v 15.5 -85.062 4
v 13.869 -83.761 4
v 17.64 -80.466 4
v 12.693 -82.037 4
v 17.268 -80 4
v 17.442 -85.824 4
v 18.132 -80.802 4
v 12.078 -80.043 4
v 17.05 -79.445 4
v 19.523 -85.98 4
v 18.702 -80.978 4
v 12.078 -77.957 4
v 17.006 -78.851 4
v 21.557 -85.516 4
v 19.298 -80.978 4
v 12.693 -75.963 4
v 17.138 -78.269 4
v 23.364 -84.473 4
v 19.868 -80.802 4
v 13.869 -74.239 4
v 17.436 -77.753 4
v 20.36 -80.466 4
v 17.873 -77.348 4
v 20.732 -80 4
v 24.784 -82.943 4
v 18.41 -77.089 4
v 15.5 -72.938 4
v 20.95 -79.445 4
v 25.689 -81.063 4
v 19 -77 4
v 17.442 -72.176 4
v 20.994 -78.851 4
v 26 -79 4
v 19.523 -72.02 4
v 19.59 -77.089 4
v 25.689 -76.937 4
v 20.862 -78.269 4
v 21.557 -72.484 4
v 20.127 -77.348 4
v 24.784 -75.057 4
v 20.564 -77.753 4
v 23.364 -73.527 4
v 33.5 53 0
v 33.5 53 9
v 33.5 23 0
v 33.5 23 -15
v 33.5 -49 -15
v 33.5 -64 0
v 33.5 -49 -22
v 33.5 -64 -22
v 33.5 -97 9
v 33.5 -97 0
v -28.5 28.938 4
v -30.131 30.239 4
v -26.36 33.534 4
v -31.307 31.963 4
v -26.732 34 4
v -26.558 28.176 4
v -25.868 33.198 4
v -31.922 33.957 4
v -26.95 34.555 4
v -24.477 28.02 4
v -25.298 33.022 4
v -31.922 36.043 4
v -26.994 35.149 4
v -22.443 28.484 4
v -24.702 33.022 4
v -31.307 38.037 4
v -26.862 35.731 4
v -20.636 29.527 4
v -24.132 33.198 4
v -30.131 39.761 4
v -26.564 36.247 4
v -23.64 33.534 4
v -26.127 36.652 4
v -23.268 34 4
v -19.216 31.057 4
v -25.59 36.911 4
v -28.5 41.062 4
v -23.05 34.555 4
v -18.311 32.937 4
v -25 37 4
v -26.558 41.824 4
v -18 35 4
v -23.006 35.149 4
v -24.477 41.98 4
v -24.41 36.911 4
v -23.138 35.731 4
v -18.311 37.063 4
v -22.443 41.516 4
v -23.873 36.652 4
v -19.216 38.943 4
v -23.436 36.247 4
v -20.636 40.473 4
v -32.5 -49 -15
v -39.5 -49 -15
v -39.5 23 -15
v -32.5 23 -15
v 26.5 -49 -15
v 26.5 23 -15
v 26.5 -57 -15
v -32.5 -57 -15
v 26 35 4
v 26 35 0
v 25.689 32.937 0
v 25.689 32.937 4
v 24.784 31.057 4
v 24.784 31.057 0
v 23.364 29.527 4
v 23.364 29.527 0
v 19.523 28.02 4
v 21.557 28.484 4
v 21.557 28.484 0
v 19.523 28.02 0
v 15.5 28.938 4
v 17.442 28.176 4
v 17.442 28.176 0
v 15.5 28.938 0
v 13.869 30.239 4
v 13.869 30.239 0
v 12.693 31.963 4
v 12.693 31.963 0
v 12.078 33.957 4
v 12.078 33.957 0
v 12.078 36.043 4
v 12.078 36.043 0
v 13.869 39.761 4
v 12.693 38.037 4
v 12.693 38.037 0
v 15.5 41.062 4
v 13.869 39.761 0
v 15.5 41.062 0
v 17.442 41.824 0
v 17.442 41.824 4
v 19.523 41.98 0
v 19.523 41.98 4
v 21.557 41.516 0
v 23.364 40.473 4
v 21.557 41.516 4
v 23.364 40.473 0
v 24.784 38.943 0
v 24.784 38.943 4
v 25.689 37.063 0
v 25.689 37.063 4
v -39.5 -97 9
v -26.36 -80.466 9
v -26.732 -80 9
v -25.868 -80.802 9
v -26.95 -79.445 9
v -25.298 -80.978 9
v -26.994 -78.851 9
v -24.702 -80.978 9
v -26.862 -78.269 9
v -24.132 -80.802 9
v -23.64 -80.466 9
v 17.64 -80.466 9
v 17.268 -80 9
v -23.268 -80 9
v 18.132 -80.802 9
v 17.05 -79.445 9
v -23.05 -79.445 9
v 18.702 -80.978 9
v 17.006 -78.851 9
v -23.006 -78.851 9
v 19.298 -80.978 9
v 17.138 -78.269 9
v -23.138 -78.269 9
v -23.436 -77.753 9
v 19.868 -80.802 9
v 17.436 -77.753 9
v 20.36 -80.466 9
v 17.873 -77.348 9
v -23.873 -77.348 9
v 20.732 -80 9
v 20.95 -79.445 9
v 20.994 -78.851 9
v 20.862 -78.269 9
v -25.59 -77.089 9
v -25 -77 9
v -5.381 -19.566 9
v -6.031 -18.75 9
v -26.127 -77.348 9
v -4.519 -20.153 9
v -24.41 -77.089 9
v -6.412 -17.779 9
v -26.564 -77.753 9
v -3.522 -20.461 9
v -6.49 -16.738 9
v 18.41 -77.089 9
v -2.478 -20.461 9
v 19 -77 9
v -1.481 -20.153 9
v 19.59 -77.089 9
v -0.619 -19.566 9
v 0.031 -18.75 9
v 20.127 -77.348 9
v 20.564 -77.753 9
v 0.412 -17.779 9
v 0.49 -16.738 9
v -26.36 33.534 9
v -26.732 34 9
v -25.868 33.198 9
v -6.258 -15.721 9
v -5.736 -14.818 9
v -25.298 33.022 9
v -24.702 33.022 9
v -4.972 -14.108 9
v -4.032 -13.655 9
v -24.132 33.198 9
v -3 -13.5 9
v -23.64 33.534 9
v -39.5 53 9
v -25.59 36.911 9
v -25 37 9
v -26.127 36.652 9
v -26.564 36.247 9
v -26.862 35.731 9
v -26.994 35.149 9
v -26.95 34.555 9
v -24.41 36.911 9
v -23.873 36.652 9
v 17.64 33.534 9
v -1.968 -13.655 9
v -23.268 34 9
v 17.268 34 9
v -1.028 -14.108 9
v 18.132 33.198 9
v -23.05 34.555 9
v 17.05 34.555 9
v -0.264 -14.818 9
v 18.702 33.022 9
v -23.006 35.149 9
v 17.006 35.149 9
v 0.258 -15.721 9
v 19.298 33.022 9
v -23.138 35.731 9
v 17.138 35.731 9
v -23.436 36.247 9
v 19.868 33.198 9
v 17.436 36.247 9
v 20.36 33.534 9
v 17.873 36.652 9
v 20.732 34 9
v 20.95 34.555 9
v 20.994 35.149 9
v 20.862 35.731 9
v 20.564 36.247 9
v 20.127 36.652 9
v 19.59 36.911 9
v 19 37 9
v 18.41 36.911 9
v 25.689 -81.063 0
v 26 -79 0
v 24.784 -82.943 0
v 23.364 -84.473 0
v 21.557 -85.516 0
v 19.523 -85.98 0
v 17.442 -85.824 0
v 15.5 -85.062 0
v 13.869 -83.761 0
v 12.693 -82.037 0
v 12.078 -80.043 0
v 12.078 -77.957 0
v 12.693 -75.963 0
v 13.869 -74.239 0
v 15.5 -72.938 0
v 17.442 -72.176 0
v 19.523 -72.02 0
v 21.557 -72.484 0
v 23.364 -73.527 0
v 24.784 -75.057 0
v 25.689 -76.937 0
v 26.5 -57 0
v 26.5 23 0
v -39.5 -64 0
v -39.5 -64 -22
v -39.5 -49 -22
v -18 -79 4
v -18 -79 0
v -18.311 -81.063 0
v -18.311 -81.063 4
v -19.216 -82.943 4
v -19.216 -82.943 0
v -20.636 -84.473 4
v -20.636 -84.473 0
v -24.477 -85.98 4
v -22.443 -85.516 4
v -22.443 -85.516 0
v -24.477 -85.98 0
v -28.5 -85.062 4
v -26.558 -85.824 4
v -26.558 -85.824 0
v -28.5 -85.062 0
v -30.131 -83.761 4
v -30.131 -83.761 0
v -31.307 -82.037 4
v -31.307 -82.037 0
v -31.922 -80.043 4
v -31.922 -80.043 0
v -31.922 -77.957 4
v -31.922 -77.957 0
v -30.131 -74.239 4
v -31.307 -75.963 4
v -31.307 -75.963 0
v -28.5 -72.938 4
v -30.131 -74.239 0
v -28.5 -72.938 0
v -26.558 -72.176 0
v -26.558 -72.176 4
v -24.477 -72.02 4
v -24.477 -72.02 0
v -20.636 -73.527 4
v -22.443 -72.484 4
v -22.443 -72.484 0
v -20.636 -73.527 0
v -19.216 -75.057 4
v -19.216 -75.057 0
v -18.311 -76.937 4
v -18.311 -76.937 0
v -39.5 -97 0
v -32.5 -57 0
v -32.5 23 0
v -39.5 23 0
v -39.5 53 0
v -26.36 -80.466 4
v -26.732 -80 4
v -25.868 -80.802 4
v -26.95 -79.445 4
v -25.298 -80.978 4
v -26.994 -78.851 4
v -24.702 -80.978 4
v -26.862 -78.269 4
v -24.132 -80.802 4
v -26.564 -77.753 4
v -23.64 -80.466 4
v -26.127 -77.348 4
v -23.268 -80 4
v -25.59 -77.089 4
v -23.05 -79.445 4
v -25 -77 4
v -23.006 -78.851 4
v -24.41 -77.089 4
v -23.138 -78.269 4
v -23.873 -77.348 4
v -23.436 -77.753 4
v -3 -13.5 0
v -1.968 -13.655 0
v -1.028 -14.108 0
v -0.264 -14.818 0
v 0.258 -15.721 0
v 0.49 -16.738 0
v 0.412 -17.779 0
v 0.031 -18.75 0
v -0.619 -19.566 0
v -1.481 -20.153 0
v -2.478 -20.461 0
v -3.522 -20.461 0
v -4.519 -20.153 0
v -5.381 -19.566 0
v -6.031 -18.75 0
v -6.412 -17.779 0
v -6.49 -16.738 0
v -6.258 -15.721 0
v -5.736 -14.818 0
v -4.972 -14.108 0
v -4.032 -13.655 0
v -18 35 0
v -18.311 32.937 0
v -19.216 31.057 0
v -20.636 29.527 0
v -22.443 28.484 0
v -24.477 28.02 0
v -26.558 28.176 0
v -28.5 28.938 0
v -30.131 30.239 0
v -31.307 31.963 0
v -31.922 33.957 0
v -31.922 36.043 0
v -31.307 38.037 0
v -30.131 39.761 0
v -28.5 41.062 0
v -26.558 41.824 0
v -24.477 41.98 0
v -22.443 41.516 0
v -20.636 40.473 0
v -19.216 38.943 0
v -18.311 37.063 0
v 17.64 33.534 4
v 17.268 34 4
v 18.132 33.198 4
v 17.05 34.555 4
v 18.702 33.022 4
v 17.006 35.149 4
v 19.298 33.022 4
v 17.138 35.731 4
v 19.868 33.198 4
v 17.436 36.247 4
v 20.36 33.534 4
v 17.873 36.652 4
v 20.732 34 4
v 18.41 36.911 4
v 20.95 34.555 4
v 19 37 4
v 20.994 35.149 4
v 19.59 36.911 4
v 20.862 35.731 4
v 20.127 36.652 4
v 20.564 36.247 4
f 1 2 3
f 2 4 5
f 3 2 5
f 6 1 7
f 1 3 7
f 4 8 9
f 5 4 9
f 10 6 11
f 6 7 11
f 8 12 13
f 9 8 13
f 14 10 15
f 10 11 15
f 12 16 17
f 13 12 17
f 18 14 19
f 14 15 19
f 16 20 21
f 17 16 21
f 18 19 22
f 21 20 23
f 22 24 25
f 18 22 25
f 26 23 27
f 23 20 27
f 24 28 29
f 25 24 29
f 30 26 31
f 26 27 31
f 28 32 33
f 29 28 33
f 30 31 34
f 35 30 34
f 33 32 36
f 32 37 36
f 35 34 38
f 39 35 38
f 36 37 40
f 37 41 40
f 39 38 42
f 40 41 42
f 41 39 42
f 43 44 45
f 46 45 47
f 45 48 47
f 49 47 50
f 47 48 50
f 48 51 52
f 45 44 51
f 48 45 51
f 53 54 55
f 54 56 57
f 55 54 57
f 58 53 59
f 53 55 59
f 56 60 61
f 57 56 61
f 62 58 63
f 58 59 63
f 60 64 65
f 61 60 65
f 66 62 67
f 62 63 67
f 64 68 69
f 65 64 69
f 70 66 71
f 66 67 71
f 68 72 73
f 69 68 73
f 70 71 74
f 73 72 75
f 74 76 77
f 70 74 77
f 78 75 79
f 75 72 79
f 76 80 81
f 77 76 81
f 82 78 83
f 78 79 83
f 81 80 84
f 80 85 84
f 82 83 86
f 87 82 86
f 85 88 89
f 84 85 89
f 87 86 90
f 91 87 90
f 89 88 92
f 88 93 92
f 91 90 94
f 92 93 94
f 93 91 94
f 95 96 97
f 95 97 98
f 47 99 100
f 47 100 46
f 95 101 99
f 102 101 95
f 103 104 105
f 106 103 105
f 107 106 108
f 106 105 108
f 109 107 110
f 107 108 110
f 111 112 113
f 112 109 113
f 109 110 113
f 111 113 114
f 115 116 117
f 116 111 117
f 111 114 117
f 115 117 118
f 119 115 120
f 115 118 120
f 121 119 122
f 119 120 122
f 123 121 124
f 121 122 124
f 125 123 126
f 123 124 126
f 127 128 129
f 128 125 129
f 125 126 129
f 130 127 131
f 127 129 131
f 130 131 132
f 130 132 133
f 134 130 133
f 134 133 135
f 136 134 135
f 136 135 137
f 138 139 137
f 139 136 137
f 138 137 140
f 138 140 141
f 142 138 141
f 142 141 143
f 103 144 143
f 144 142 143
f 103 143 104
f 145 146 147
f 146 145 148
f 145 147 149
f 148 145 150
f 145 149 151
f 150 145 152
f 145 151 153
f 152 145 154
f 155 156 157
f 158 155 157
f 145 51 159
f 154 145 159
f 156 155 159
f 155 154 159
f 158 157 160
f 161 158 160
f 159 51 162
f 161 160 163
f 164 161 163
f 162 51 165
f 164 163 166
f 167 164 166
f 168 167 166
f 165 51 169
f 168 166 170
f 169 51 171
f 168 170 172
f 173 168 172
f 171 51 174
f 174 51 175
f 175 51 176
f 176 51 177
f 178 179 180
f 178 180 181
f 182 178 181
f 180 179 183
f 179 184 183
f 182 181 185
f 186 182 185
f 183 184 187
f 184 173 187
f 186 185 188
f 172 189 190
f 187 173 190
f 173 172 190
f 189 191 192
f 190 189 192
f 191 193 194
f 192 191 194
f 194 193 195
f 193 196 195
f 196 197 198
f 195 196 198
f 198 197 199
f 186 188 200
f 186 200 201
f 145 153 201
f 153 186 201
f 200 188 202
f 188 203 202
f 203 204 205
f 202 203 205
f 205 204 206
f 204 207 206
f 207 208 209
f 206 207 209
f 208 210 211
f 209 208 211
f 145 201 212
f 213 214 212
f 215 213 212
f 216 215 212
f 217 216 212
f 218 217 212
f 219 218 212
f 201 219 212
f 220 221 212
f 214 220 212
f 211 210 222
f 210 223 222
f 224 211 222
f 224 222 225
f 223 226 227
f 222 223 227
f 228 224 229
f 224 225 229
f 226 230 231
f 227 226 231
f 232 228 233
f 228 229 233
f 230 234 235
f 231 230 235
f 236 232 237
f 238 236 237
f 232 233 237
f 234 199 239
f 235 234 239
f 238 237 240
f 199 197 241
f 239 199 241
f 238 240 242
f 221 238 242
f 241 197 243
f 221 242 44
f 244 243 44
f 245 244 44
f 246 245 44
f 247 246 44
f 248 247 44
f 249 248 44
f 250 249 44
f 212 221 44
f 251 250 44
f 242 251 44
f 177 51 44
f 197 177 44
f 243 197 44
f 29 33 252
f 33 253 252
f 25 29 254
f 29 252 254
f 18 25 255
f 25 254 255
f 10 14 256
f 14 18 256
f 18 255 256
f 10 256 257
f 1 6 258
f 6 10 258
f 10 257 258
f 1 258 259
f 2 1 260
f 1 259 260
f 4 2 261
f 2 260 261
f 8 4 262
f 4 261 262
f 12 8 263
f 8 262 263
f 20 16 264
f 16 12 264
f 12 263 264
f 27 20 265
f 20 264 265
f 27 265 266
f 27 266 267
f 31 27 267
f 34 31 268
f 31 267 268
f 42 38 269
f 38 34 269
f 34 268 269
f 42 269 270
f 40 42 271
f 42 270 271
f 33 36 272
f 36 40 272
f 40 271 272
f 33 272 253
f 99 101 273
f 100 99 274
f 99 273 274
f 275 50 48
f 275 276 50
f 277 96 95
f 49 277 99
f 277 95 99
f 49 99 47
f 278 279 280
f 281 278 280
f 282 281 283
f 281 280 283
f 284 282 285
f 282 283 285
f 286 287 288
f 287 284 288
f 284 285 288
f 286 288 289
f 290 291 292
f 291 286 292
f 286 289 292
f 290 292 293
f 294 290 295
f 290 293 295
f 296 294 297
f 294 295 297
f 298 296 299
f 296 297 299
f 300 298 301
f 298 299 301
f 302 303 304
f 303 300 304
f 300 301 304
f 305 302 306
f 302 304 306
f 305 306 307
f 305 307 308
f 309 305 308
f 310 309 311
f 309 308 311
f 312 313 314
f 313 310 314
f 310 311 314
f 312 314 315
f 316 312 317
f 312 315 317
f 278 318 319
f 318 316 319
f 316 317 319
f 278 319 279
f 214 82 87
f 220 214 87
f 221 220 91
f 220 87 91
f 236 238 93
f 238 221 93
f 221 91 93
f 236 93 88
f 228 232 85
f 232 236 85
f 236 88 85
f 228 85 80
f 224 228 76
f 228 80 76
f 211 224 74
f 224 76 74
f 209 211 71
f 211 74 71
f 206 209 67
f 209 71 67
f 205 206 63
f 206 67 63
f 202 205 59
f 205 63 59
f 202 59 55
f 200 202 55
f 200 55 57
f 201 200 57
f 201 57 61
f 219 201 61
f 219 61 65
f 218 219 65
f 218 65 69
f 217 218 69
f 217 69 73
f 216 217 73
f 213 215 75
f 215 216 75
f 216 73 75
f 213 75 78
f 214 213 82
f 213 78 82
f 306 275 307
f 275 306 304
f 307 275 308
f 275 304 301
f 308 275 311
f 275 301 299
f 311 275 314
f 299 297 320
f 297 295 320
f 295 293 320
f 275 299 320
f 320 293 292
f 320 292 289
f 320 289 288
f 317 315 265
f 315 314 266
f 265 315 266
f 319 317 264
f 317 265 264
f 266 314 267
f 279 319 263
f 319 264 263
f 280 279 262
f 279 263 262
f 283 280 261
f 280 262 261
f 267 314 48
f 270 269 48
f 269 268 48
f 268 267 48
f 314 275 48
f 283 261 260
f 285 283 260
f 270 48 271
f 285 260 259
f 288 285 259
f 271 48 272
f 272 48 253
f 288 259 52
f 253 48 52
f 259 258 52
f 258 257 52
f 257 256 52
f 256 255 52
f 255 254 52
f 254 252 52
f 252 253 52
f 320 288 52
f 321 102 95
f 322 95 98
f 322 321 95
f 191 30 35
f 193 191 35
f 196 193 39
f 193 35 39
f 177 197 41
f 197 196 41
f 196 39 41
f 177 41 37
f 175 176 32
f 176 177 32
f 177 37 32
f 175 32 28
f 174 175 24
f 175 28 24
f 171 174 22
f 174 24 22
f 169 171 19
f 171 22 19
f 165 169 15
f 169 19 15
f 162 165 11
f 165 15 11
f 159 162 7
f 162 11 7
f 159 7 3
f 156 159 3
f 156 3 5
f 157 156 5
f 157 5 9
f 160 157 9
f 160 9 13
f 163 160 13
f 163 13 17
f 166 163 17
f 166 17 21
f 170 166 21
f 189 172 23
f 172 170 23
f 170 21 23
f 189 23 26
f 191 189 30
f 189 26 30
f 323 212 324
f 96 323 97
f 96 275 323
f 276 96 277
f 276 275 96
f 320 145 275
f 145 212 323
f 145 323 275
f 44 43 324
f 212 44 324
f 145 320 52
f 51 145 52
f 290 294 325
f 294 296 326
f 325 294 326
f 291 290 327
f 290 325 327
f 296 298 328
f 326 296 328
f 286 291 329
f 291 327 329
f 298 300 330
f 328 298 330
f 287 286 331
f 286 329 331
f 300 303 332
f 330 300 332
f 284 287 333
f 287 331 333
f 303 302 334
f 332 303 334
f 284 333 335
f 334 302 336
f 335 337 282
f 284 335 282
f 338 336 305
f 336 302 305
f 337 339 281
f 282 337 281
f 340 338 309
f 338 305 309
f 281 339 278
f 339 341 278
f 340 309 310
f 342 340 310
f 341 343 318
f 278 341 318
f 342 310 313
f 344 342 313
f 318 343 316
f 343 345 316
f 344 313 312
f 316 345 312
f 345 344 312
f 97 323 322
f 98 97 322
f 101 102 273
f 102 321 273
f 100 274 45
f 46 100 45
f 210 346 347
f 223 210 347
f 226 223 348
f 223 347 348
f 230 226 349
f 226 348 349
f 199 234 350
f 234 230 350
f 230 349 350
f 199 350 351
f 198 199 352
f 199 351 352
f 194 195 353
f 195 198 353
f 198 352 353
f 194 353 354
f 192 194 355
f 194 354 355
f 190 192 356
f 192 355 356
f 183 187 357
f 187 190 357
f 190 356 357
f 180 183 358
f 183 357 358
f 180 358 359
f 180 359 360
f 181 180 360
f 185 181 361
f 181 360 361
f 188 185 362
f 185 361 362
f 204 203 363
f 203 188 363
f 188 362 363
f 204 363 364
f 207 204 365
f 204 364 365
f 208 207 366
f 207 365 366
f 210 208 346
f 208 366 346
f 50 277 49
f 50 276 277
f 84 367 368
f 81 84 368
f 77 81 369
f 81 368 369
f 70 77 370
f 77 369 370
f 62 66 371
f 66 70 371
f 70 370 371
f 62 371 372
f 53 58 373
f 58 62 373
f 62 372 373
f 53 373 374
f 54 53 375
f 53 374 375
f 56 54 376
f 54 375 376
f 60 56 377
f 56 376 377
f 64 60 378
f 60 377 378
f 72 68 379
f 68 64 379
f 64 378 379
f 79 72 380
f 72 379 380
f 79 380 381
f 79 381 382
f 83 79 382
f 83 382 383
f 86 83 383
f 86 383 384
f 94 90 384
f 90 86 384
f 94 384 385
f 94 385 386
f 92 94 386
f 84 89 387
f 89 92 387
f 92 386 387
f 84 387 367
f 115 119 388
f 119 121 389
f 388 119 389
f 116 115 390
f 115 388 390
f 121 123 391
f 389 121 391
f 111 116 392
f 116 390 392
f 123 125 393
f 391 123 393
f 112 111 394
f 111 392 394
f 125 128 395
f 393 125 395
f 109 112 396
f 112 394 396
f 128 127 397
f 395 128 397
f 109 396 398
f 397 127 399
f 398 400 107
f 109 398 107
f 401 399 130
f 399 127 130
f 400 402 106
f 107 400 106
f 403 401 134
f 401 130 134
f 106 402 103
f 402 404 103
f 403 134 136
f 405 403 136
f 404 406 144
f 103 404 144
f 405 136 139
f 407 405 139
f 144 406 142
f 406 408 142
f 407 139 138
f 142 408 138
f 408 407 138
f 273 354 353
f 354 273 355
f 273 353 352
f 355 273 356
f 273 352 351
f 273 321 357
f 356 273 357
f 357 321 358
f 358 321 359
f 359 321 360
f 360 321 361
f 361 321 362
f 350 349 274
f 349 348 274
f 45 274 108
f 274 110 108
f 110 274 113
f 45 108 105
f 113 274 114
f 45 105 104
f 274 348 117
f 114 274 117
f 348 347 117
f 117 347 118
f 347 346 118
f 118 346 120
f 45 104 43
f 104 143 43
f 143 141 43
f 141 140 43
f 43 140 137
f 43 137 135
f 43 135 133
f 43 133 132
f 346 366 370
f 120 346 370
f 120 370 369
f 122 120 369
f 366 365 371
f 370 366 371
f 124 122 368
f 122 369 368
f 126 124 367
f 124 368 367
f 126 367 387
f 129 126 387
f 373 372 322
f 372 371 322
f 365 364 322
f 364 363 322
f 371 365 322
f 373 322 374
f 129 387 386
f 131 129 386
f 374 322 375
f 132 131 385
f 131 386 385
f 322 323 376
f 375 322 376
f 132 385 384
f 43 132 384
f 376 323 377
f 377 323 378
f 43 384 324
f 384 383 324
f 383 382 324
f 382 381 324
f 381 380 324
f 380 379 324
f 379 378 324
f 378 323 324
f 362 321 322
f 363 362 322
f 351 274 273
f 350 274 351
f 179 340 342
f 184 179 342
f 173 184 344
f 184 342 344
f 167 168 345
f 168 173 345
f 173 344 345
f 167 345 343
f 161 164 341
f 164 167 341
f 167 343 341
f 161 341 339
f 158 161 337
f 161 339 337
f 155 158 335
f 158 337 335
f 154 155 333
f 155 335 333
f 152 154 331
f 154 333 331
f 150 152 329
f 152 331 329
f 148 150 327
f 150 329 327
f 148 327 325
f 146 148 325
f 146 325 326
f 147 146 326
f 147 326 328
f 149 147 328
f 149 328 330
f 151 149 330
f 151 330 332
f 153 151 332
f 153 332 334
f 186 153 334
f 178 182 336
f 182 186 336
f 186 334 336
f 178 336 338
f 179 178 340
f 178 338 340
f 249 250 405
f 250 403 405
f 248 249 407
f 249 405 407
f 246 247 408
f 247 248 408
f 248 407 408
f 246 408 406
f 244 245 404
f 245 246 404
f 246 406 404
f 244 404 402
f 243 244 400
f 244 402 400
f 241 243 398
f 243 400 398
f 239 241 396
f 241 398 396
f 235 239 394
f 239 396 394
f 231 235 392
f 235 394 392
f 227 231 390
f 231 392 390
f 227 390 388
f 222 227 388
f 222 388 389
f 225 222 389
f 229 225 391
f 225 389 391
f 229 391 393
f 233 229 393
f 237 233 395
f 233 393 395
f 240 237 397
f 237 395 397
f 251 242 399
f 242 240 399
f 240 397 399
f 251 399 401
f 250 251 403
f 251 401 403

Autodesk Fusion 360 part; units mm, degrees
sketch "Sketch1" plane through (0, 0, 0) normal (0, 0, 1) x (1, 0, 0)
  line L0 (-25, 35) -> (19, 35)
  line L1 (19, 35) -> (19, -79)
  line L2 (19, -79) -> (-25, -79)
  line L3 (-25, -79) -> (-25, 35)
  line L4 (-25, 35) -> (-32.5, 35)
  line L5 (-32.5, 35) -> (-32.5, 42.5)
  line L6 (-32.5, 42.5) -> (-25, 42.5)
  line L7 (-25, 42.5) -> (-25, 35)
  line L8 (-32.5, 42.5) -> (26.5, 42.5)
  line L9 (26.5, 42.5) -> (26.5, -86.5)
  line L10 (26.5, -86.5) -> (-32.5, -86.5)
  line L11 (-32.5, -86.5) -> (-32.5, 42.5)
  dimension "d1" = 44
  dimension "d2" = 114
  dimension "d3" = 7.5
  dimension "d4" = 7.5
  dimension "d5" = 59
  dimension "d6" = 129
extrude "Extrude1" add sketch "Sketch1" along normal blind 7 contours L0 L1 L2 L3 | L4 L7 L8 L9 L10 L11 | L4 L5 L6 L7 L8 L11 makes body 1
sketch "Sketch2" plane through (0, 0, 0) normal (0, 0, 1) x (1, 0, 0)
  circle A0 centre (-25, -79) radius 7
  circle A1 centre (19, -79) radius 7
  circle A2 centre (19, 35) radius 7
  circle A3 centre (-25, 35) radius 7
  point P0 (-25, -79)
  point P1 (19, -79)
  point P2 (19, 35)
  point P3 (-25, 35)
  dimension "d9" = 14
  dimension "d10" = 14
  dimension "d11" = 14
  dimension "d12" = 14
extrude "Extrude2" cut sketch "Sketch2" along normal blind 4 contours A0 bodies 1
extrude "Extrude3" cut sketch "Sketch2" along normal blind 4 contours A1 bodies 1
extrude "Extrude4" cut sketch "Sketch2" along normal blind 4 contours A3 bodies 1
extrude "Extrude5" cut sketch "Sketch2" along normal blind 4 contours A2 bodies 1
sketch "Sketch3" plane through (0, 0, 0) normal (0, 0, 1) x (1, 0, 0)
hole "Hole1" at (-25, -79, 4) direction (0, 0, 1) diameter 4 depth 10 tip angle 118 bodies 1
hole "Hole2" at (19, -79, 4) direction (0, 0, 1) diameter 4 depth 10 tip angle 118 bodies 1
hole "Hole3" at (19, 35, 4) direction (0, 0, 1) diameter 4 depth 10 tip angle 118 bodies 1
hole "Hole4" at (-25, 35, 4) direction (0, 0, 1) diameter 4 depth 10 tip angle 118 bodies 1
extrude "Extrude6" add 1 faces at (-12.8333, 42.5, 2.3333) along direction (0, 1, 0) blind 10.5 on bodies 1 bodies 1
extrude "Extrude7" add 1 faces at (6.8333, -86.5, 2.3333) along direction (0, -1, 0) blind 10.5 on bodies 1 bodies 1
sketch "Sketch4" plane through (0, 0, 0) normal (0, 0, -1) x (1, 0, 0)
  circle A0 centre (19, -35) radius 7
  circle A1 centre (-25, -35) radius 7
  circle A2 centre (19, 79) radius 7
  circle A3 centre (-25, 79) radius 7
  line L0 (-32.5, 97) -> (-32.5, -53)
  line L1 (-32.5, -53) -> (26.5, -53)
  line L2 (26.5, -53) -> (26.5, 97)
  line L3 (26.5, 97) -> (-32.5, 97)
  line L4 (-32.5, -53) -> (26.5, -53)
  line L5 (26.5, -53) -> (26.5, 17)
  line L6 (26.5, 17) -> (-32.5, 17)
  line L7 (-32.5, 17) -> (-32.5, -53)
  line L8 (-32.5, 17) -> (-3, 17)
  line L9 (26.5, 17) -> (-3, 17)
  dimension "d37" = 70
hole "Hole5" at (-3, -17, 0) direction (0, 0, 1) diameter 7 depth 10 tip angle 118 bodies 1
sketch "Sketch5" plane through (0, 0, 0) normal (0, 0, -1) x (1, 0, 0)
  line L0 (26.5, 17) -> (-32.5, 17)
  line L1 (-32.5, 17) -> (-32.5, -23)
  line L2 (-32.5, -23) -> (26.5, -23)
  line L3 (26.5, -23) -> (26.5, 17)
  point P0 (26.5, 17)
  dimension "d41" = 59
  dimension "d42" = 40
sketch "Sketch6" plane through (0, 0, 7) normal (0, 0, 1) x (-1, 0, 0)
  circle A0 centre (3, 17) radius 3.5
  circle A1 centre (25, -35) radius 2
  circle A2 centre (-19, -35) radius 2
  circle A3 centre (-19, 79) radius 2
  circle A4 centre (25, 79) radius 2
  line L0 (-26.5, 97) -> (-26.5, -53)
  line L1 (-26.5, -53) -> (32.5, -53)
  line L2 (32.5, -53) -> (32.5, 97)
  line L3 (32.5, 97) -> (-26.5, 97)
  line L4 (-26.5, 17) -> (32.5, 17)
  line L5 (32.5, 17) -> (32.5, 57)
  line L6 (32.5, 57) -> (-26.5, 57)
  line L7 (-26.5, 57) -> (-26.5, 17)
  line L8 (32.5, 57) -> (-26.5, 57)
  line L9 (-26.5, 57) -> (-26.5, 64)
  line L10 (-26.5, 64) -> (32.5, 64)
  line L11 (32.5, 64) -> (32.5, 57)
  point P0 (-26.5, 17)
  dimension "d43" = 40
  dimension "d44" = 7
sketch "Sketch7" plane through (-32.5, 0, 0) normal (-1, 0, 0) x (0, -1, 0)
  line L0 (-53, 0) -> (97, 0)
  line L1 (97, 0) -> (97, 7)
  line L2 (97, 7) -> (-53, 7)
  line L3 (-53, 7) -> (-53, 0)
  line L4 (57, 7) -> (64, 7)
  line L5 (64, 7) -> (64, 0)
  line L6 (64, 0) -> (57, 0)
  line L7 (57, 0) -> (57, 7)
  point P0 (57, 7)
sketch "Sketch8" plane through (26.5, 0, 0) normal (1, 0, 0) x (0, 1, 0)
  line L0 (-97, 0) -> (53, 0)
  line L1 (53, 0) -> (53, 7)
  line L2 (53, 7) -> (-97, 7)
  line L3 (-97, 7) -> (-97, 0)
  line L4 (-64, 7) -> (-57, 7)
  line L5 (-57, 7) -> (-57, 0)
  line L6 (-57, 0) -> (-64, 0)
  line L7 (-64, 0) -> (-64, 7)
  point P0 (-64, 7)
  point P1 (-57, 0)
extrude "Extrude8" add sketch "Sketch8" along normal blind 7 separate body contours L0 L2 L4 L5 L6 L7 | L0 L1 L2 L5 makes body 2
sketch "Sketch9" plane through (0, 0, 0) normal (0, 0, -1) x (1, 0, 0)
  line L0 (-32.5, 57) -> (26.5, 57)
  line L1 (26.5, 57) -> (26.5, 64)
  line L2 (26.5, 64) -> (-32.5, 64)
  line L3 (-32.5, 64) -> (-32.5, 57)
  point P0 (-32.5, 57)
  point P1 (26.5, 64)
extrude "Extrude9" add sketch "Sketch7" along normal blind 7 separate body contours L0 L2 L3 L7 | L0 L2 L4 L5 L6 L7 makes body 3
sketch "Sketch10" plane through (0, 0, 0) normal (0, 0, -1) x (1, 0, 0)
  line L0 (26.5, 64) -> (26.5, -53)
  line L1 (26.5, -53) -> (33.5, -53)
  line L2 (33.5, -53) -> (33.5, 64)
  line L3 (33.5, 64) -> (26.5, 64)
  line L4 (-32.5, -53) -> (-39.5, -53)
  line L5 (-39.5, -53) -> (-39.5, -23)
  line L6 (-39.5, -23) -> (-32.5, -23)
  line L7 (-32.5, -23) -> (-32.5, -53)
  line L8 (33.5, -53) -> (26.5, -53)
  line L9 (26.5, -53) -> (26.5, -23)
  line L10 (26.5, -23) -> (33.5, -23)
  line L11 (33.5, -23) -> (33.5, -53)
  line L12 (-32.5, -23) -> (-39.5, -23)
  line L13 (-39.5, -23) -> (-39.5, 64)
  line L14 (-39.5, 64) -> (-32.5, 64)
  line L15 (-32.5, 64) -> (-32.5, -23)
  line L16 (33.5, -23) -> (26.5, -23)
  line L17 (26.5, -23) -> (26.5, 64)
  line L18 (26.5, 64) -> (33.5, 64)
  line L19 (33.5, 64) -> (33.5, -23)
  point P0 (-32.5, -53)
  point P1 (26.5, -23)
  point P2 (-39.5, 64)
  dimension "d49" = 30
extrude "Extrude10" add sketch "Sketch9" sketch "Sketch10" along normal blind 15 of sketch 2 contours L0 L2 L3 L10 L16 L17 L18 L19 | L6 L12 L13 L14 L15 bodies 1 2 3
extrude "Extrude11" add sketch "Sketch8" along normal blind 7 contours L0 L2 L3 L7 bodies 1
extrude "Extrude12" add sketch "Sketch7" along normal blind 7 contours L0 L1 L2 L5 bodies 1
extrude "Extrude13" add 1 faces at (-3, -58.4478, 7) along direction (0, 0, 1) blind 2 on bodies 1 bodies 1
sketch "Sketch11" plane through (0, 0, -15) normal (0, 0, -1) x (1, 0, 0)
  line L0 (-32.5, 57) -> (26.5, 57)
  line L1 (26.5, 57) -> (26.5, -23)
  line L2 (26.5, -23) -> (33.5, -23)
  line L3 (33.5, -23) -> (33.5, 64)
  line L4 (33.5, 64) -> (-39.5, 64)
  line L5 (-39.5, 64) -> (-39.5, -23)
  line L6 (-39.5, -23) -> (-32.5, -23)
  line L7 (-32.5, -23) -> (-32.5, 57)
  line L8 (-32.5, 57) -> (-39.5, 57)
  line L9 (-39.5, 57) -> (-39.5, 64)
  line L10 (-39.5, 64) -> (-32.5, 64)
  line L11 (-32.5, 64) -> (-32.5, 57)
  line L12 (26.5, 57) -> (33.5, 57)
  line L13 (33.5, 57) -> (33.5, 64)
  line L14 (33.5, 64) -> (26.5, 64)
  line L15 (26.5, 64) -> (26.5, 57)
  line L16 (26.5, 57) -> (-32.5, 57)
  line L17 (-32.5, 57) -> (-32.5, 64)
  line L18 (-32.5, 64) -> (26.5, 64)
  line L19 (26.5, 64) -> (26.5, 57)
  line L20 (33.5, 57) -> (-39.5, 57)
  line L21 (-39.5, 57) -> (-39.5, 49)
  line L22 (-39.5, 49) -> (33.5, 49)
  line L23 (33.5, 49) -> (33.5, 57)
  dimension "d58" = 8
extrude "Extrude14" add sketch "Sketch11" along normal blind 7 separate body contours L0 L4 L11 L15 L16 L17 L18 L19 L20 | L4 L5 L8 L9 L10 L11 L17 L20 | L3 L4 L12 L13 L14 L15 L19 L20 makes body 4
extrude "Extrude15" add 3 faces at (-34.8333, -57, -17.3333) (-12.8333, -57, -17.3333) (28.8333, -57, -17.3333) along direction (0, 1, 0) blind 8 on bodies 4 bodies 1 4
